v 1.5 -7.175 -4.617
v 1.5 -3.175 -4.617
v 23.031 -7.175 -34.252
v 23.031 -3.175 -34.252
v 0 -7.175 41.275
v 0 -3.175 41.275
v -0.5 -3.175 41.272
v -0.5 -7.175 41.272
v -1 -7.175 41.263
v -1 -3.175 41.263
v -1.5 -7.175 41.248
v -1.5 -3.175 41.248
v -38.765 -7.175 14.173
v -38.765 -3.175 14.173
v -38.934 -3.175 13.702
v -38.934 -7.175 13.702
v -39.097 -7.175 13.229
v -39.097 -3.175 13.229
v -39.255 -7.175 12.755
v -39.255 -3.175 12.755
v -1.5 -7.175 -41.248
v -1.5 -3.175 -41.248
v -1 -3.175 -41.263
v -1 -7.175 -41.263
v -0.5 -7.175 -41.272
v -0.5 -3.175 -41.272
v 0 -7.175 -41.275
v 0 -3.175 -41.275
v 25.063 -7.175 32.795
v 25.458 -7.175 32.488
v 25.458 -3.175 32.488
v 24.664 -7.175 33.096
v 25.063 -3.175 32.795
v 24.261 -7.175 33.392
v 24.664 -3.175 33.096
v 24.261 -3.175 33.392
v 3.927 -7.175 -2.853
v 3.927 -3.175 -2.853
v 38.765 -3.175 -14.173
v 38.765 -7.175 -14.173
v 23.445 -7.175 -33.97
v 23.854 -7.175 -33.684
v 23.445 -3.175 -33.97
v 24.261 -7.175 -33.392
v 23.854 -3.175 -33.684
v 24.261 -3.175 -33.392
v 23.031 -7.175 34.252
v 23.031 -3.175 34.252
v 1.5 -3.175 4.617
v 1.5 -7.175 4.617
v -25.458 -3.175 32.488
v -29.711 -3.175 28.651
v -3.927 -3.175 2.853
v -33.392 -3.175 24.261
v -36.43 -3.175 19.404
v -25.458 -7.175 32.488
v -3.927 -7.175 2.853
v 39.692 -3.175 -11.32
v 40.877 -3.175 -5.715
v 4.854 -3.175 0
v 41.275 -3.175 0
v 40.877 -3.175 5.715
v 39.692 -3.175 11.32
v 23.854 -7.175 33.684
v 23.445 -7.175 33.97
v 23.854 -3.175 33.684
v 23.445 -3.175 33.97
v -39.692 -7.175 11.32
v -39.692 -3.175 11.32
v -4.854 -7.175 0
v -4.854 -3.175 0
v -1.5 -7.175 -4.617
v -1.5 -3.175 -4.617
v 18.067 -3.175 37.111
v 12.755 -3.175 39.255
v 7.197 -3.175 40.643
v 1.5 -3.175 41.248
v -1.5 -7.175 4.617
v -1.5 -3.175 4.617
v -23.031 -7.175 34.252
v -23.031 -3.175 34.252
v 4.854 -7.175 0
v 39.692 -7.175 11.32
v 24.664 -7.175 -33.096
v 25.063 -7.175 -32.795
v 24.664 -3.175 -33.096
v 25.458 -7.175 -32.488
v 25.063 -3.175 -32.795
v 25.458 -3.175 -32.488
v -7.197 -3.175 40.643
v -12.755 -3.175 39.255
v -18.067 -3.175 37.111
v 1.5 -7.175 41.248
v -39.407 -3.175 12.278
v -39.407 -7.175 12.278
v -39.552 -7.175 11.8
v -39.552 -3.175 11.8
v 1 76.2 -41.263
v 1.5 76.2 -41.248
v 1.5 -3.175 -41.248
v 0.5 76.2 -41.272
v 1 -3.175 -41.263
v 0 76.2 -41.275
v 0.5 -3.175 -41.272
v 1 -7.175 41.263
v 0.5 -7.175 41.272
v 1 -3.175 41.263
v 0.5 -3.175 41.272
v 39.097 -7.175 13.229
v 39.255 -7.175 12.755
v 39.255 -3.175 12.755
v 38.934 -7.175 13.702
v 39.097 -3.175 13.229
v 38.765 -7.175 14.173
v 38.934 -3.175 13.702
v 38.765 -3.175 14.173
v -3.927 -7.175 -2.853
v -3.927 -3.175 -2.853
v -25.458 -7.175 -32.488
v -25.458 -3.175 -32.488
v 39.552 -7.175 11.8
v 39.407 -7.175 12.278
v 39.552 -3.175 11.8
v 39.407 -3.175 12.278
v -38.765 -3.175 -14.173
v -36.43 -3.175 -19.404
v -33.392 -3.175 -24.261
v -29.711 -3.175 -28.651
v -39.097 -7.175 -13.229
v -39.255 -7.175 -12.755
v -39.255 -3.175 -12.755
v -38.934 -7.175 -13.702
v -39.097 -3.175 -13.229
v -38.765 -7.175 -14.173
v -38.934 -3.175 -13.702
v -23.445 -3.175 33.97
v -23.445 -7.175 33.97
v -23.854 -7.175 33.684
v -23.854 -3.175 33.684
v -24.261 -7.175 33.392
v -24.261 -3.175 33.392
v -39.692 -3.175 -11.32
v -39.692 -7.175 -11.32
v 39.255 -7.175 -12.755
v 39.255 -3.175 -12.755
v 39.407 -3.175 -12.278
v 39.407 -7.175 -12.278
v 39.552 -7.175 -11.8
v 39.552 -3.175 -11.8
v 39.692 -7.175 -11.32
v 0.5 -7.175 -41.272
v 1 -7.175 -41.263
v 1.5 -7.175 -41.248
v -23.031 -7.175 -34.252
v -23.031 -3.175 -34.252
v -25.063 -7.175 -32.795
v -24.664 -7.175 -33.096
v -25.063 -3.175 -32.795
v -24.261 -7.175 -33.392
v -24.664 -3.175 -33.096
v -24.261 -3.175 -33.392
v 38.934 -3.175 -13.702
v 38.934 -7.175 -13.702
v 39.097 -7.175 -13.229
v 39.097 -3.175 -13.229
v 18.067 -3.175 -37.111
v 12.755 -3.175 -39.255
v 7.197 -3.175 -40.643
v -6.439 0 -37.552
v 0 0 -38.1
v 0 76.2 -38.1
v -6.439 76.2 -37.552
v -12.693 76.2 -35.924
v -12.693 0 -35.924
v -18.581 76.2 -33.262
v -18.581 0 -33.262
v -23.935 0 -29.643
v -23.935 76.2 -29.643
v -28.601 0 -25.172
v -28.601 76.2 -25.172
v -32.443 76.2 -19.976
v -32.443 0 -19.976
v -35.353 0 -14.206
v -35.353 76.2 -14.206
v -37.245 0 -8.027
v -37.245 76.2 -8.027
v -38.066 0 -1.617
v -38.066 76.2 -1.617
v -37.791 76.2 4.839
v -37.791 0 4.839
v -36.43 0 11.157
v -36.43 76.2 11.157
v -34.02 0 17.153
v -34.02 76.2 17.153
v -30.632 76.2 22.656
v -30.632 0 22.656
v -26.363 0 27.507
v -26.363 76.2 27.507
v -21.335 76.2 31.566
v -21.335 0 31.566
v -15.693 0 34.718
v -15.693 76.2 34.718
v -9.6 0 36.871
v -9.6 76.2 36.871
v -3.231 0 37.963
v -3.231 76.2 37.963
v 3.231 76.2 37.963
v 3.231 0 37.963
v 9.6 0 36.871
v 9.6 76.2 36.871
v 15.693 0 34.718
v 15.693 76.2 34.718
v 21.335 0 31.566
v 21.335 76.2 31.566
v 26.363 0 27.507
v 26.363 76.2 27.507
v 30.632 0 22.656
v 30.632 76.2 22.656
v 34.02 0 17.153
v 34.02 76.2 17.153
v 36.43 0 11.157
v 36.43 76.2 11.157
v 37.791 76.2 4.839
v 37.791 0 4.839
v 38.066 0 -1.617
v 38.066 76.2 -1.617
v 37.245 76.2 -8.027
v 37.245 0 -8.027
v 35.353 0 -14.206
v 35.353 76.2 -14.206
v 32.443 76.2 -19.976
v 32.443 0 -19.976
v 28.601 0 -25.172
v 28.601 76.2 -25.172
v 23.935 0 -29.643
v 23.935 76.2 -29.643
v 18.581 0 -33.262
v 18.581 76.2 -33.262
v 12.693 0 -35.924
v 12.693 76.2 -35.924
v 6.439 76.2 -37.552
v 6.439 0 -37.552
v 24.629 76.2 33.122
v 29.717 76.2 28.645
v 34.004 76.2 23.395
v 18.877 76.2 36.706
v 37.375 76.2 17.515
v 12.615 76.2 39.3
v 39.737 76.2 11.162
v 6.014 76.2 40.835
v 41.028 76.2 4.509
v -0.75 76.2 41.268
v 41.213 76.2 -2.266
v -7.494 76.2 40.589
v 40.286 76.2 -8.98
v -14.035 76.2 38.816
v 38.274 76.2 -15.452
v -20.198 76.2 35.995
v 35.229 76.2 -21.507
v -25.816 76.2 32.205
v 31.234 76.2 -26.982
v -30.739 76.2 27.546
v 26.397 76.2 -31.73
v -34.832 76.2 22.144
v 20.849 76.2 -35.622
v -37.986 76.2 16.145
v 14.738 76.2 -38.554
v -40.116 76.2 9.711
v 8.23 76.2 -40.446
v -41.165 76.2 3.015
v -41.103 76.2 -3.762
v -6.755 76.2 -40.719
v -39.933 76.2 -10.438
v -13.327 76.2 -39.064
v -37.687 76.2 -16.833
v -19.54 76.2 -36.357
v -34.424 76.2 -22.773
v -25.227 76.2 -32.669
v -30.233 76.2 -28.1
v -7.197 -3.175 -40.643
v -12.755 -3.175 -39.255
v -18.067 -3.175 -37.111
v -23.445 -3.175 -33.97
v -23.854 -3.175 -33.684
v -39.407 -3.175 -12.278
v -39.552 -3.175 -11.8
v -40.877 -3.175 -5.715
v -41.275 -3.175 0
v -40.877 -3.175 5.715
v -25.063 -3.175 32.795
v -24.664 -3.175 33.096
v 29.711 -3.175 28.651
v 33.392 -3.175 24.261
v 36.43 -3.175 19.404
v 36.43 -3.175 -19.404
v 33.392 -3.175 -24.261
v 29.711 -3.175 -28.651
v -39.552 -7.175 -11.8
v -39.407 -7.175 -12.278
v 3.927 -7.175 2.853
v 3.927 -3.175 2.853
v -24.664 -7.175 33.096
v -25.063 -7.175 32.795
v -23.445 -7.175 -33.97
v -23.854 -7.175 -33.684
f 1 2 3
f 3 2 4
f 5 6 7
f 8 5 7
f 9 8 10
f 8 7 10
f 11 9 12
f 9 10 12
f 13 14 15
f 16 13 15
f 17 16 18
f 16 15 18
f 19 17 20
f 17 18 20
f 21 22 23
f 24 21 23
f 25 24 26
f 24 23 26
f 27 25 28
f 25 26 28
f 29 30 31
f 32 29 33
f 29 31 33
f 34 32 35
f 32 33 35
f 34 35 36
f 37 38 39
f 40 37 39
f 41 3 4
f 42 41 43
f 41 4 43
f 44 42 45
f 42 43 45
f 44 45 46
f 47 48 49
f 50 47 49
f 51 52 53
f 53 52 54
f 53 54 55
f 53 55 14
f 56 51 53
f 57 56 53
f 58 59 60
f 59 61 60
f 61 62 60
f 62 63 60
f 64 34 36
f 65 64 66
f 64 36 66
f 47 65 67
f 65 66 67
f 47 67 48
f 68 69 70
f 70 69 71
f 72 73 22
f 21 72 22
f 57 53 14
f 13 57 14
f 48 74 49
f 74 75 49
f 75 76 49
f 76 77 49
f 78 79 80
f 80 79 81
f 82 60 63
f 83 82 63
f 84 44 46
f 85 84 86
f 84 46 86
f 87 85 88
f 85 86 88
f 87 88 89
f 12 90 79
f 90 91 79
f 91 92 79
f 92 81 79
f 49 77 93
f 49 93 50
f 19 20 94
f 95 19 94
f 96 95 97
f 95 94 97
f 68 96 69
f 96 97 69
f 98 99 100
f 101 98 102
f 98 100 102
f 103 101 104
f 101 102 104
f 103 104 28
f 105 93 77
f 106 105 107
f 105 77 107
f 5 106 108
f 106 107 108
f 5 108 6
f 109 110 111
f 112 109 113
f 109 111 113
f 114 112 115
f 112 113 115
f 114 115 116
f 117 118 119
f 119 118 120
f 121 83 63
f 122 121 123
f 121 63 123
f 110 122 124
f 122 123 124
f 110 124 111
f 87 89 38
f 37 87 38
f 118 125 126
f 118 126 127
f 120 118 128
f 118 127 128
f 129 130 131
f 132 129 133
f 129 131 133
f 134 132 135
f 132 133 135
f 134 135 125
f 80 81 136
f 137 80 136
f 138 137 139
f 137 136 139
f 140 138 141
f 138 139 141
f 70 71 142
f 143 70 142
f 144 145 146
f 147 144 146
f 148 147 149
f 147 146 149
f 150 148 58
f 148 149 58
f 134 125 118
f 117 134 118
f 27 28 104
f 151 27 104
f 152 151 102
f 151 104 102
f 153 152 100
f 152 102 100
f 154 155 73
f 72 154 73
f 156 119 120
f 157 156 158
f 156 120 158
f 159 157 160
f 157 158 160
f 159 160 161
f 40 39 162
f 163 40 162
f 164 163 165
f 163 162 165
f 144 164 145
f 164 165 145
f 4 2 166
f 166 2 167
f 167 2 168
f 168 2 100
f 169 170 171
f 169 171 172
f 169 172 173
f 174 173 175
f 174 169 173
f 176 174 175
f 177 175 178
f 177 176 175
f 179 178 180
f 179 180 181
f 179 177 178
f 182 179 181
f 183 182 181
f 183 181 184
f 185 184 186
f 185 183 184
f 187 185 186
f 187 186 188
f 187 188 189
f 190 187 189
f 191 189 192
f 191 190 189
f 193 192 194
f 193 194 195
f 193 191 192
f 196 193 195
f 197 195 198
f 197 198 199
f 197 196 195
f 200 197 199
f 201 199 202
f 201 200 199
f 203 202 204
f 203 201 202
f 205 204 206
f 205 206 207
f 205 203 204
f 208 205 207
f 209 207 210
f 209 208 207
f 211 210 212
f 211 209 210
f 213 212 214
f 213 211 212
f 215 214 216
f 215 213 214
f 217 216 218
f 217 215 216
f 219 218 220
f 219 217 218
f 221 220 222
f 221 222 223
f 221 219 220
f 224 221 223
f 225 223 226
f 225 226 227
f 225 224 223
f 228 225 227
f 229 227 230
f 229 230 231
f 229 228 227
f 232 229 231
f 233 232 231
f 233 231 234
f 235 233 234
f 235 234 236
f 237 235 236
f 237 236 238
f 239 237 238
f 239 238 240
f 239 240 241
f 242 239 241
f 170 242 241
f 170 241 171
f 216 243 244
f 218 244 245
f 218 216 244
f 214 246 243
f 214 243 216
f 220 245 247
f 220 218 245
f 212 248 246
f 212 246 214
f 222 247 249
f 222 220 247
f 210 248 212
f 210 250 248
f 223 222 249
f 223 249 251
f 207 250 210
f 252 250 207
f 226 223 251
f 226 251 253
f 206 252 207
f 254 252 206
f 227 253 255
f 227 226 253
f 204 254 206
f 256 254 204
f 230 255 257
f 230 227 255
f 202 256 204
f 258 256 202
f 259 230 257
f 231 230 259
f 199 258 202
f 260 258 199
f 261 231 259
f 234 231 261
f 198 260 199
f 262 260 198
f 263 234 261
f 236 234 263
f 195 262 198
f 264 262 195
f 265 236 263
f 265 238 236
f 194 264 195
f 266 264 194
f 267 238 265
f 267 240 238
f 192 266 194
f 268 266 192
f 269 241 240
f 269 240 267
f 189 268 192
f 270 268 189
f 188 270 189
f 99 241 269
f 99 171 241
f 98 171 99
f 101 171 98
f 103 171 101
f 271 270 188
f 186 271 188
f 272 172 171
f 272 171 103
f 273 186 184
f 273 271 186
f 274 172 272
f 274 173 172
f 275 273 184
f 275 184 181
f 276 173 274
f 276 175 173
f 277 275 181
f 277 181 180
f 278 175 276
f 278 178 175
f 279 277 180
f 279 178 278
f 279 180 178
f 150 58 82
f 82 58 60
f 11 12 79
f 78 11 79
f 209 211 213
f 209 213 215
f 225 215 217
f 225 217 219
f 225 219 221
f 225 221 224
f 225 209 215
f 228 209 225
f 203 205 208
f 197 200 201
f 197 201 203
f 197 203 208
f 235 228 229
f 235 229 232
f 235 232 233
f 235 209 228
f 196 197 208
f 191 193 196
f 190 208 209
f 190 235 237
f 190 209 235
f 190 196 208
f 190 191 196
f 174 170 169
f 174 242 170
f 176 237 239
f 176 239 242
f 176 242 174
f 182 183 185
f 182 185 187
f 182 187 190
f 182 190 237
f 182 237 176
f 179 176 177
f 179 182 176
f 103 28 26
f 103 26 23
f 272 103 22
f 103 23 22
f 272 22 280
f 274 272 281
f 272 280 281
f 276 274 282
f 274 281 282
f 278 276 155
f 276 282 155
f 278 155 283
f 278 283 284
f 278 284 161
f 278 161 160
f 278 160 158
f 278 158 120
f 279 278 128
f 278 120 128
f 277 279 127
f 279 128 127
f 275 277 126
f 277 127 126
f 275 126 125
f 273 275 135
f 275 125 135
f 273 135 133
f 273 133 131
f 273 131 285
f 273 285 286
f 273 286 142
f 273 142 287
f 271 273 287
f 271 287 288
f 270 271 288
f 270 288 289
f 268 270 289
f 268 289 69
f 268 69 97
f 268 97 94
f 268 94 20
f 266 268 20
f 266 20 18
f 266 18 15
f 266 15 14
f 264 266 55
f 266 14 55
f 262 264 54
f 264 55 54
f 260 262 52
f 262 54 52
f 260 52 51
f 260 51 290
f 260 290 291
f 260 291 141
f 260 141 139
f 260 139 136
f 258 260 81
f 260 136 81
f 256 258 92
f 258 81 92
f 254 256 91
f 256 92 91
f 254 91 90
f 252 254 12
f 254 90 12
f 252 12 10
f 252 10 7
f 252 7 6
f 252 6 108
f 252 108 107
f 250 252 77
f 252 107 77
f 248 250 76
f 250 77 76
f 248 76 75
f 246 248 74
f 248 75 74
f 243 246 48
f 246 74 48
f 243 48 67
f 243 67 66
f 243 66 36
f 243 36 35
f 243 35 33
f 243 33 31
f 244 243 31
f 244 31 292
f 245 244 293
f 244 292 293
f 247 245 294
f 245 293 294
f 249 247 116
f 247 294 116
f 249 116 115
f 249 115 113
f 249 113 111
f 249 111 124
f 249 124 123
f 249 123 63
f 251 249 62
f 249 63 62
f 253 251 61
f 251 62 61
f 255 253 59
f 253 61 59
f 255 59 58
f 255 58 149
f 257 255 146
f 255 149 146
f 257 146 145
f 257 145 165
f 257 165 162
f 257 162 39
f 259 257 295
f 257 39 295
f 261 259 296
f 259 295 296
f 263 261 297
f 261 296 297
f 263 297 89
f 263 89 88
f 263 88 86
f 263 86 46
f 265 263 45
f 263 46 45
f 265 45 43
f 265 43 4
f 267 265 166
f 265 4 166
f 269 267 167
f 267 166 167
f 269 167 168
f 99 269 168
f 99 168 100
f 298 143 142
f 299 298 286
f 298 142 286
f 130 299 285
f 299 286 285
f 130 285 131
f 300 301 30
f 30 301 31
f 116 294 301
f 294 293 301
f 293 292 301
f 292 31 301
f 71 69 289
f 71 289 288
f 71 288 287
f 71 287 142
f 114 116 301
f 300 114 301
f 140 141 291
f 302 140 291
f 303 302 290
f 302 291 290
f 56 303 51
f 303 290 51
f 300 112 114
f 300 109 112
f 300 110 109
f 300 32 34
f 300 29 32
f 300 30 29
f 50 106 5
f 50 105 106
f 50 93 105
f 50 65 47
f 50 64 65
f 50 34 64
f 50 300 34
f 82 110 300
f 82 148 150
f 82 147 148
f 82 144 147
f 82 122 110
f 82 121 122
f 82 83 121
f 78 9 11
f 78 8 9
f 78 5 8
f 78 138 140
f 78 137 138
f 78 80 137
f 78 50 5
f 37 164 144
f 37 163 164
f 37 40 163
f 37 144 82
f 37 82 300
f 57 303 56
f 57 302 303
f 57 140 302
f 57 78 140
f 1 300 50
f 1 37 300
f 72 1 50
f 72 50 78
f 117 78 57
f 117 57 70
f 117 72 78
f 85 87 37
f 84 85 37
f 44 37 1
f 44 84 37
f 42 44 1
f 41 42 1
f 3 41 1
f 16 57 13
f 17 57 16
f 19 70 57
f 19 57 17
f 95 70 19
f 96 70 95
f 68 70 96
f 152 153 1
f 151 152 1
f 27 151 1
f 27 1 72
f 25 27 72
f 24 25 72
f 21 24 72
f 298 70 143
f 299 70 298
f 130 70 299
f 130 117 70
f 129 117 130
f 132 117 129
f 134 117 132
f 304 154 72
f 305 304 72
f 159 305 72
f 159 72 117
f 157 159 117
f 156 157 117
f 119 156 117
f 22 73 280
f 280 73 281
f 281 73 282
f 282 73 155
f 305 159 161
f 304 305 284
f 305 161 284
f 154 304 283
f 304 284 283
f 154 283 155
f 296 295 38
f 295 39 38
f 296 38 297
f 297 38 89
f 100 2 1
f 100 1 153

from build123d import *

# Parameters (mm, degrees)
SKETCH1_R               = 38.1
BOSS_EXTRUDE1_DEPTH     = 76.2
SHELL2_T                = 3.175
SKETCH2_W               = 3
SKETCH2_H               = 82.55
BOSS_EXTRUDE2_DEPTH     = 4
CUT_EXTRUDE1_DEPTH      = 99.527366122
CUT_EXTRUDE1_DEPTH_BACK = 99.527366122
SKETCH3_R               = 61.906276858
SKETCH3_R_2             = 41.275


with BuildPart() as part:
    # Sketch1 → Boss-Extrude1 (new body)
    with BuildSketch(Plane(origin=(0, 0, 0), x_dir=(1, 0, 0), z_dir=(0, 1, 0))):
        Circle(SKETCH1_R)
    extrude(amount=BOSS_EXTRUDE1_DEPTH)

    # Shell2
    shell2_openings = [part.faces().sort_by_distance(p)[0] for p in [
        (0, 76.2, 0),
    ]]
    offset(amount=SHELL2_T, openings=shell2_openings, kind=Kind.INTERSECTION)

    # Sketch2 → Boss-Extrude2 (add)
    with BuildSketch(Plane(origin=(0, -3.175, 0), x_dir=(-1, 0, 0), z_dir=(0, -1, 0))):
        Rectangle(SKETCH2_W, SKETCH2_H)
        Polygon((-23.047310797, -34.273854321), (25.47436178, 32.510498564), (23.047310797, 34.273854321), (-25.47436178, -32.510498564), align=None)
        Polygon((-38.791332219, -14.181261217), (39.718383202, 11.328091668), (38.791332219, 14.181261217), (-39.718383202, -11.328091668), align=None)
        Polygon((-39.718383202, 11.328091668), (38.791332219, -14.181261217), (39.718383202, -11.328091668), (-38.791332219, 14.181261217), align=None)
        Polygon((-25.47436178, 32.510498564), (23.047310797, -34.273854321), (25.47436178, -32.510498564), (-23.047310797, 34.273854321), align=None)
    extrude(amount=BOSS_EXTRUDE2_DEPTH)

    # Sketch3 → Cut-Extrude1 (cut, two sides: drawn at the far end of the back side and taken through both)
    with BuildSketch(Plane.XZ.offset(3.175).offset(-CUT_EXTRUDE1_DEPTH_BACK)):
        Circle(SKETCH3_R)
        Circle(SKETCH3_R_2, mode=Mode.SUBTRACT)
    extrude(amount=CUT_EXTRUDE1_DEPTH + CUT_EXTRUDE1_DEPTH_BACK, mode=Mode.SUBTRACT)


solid = part.part
